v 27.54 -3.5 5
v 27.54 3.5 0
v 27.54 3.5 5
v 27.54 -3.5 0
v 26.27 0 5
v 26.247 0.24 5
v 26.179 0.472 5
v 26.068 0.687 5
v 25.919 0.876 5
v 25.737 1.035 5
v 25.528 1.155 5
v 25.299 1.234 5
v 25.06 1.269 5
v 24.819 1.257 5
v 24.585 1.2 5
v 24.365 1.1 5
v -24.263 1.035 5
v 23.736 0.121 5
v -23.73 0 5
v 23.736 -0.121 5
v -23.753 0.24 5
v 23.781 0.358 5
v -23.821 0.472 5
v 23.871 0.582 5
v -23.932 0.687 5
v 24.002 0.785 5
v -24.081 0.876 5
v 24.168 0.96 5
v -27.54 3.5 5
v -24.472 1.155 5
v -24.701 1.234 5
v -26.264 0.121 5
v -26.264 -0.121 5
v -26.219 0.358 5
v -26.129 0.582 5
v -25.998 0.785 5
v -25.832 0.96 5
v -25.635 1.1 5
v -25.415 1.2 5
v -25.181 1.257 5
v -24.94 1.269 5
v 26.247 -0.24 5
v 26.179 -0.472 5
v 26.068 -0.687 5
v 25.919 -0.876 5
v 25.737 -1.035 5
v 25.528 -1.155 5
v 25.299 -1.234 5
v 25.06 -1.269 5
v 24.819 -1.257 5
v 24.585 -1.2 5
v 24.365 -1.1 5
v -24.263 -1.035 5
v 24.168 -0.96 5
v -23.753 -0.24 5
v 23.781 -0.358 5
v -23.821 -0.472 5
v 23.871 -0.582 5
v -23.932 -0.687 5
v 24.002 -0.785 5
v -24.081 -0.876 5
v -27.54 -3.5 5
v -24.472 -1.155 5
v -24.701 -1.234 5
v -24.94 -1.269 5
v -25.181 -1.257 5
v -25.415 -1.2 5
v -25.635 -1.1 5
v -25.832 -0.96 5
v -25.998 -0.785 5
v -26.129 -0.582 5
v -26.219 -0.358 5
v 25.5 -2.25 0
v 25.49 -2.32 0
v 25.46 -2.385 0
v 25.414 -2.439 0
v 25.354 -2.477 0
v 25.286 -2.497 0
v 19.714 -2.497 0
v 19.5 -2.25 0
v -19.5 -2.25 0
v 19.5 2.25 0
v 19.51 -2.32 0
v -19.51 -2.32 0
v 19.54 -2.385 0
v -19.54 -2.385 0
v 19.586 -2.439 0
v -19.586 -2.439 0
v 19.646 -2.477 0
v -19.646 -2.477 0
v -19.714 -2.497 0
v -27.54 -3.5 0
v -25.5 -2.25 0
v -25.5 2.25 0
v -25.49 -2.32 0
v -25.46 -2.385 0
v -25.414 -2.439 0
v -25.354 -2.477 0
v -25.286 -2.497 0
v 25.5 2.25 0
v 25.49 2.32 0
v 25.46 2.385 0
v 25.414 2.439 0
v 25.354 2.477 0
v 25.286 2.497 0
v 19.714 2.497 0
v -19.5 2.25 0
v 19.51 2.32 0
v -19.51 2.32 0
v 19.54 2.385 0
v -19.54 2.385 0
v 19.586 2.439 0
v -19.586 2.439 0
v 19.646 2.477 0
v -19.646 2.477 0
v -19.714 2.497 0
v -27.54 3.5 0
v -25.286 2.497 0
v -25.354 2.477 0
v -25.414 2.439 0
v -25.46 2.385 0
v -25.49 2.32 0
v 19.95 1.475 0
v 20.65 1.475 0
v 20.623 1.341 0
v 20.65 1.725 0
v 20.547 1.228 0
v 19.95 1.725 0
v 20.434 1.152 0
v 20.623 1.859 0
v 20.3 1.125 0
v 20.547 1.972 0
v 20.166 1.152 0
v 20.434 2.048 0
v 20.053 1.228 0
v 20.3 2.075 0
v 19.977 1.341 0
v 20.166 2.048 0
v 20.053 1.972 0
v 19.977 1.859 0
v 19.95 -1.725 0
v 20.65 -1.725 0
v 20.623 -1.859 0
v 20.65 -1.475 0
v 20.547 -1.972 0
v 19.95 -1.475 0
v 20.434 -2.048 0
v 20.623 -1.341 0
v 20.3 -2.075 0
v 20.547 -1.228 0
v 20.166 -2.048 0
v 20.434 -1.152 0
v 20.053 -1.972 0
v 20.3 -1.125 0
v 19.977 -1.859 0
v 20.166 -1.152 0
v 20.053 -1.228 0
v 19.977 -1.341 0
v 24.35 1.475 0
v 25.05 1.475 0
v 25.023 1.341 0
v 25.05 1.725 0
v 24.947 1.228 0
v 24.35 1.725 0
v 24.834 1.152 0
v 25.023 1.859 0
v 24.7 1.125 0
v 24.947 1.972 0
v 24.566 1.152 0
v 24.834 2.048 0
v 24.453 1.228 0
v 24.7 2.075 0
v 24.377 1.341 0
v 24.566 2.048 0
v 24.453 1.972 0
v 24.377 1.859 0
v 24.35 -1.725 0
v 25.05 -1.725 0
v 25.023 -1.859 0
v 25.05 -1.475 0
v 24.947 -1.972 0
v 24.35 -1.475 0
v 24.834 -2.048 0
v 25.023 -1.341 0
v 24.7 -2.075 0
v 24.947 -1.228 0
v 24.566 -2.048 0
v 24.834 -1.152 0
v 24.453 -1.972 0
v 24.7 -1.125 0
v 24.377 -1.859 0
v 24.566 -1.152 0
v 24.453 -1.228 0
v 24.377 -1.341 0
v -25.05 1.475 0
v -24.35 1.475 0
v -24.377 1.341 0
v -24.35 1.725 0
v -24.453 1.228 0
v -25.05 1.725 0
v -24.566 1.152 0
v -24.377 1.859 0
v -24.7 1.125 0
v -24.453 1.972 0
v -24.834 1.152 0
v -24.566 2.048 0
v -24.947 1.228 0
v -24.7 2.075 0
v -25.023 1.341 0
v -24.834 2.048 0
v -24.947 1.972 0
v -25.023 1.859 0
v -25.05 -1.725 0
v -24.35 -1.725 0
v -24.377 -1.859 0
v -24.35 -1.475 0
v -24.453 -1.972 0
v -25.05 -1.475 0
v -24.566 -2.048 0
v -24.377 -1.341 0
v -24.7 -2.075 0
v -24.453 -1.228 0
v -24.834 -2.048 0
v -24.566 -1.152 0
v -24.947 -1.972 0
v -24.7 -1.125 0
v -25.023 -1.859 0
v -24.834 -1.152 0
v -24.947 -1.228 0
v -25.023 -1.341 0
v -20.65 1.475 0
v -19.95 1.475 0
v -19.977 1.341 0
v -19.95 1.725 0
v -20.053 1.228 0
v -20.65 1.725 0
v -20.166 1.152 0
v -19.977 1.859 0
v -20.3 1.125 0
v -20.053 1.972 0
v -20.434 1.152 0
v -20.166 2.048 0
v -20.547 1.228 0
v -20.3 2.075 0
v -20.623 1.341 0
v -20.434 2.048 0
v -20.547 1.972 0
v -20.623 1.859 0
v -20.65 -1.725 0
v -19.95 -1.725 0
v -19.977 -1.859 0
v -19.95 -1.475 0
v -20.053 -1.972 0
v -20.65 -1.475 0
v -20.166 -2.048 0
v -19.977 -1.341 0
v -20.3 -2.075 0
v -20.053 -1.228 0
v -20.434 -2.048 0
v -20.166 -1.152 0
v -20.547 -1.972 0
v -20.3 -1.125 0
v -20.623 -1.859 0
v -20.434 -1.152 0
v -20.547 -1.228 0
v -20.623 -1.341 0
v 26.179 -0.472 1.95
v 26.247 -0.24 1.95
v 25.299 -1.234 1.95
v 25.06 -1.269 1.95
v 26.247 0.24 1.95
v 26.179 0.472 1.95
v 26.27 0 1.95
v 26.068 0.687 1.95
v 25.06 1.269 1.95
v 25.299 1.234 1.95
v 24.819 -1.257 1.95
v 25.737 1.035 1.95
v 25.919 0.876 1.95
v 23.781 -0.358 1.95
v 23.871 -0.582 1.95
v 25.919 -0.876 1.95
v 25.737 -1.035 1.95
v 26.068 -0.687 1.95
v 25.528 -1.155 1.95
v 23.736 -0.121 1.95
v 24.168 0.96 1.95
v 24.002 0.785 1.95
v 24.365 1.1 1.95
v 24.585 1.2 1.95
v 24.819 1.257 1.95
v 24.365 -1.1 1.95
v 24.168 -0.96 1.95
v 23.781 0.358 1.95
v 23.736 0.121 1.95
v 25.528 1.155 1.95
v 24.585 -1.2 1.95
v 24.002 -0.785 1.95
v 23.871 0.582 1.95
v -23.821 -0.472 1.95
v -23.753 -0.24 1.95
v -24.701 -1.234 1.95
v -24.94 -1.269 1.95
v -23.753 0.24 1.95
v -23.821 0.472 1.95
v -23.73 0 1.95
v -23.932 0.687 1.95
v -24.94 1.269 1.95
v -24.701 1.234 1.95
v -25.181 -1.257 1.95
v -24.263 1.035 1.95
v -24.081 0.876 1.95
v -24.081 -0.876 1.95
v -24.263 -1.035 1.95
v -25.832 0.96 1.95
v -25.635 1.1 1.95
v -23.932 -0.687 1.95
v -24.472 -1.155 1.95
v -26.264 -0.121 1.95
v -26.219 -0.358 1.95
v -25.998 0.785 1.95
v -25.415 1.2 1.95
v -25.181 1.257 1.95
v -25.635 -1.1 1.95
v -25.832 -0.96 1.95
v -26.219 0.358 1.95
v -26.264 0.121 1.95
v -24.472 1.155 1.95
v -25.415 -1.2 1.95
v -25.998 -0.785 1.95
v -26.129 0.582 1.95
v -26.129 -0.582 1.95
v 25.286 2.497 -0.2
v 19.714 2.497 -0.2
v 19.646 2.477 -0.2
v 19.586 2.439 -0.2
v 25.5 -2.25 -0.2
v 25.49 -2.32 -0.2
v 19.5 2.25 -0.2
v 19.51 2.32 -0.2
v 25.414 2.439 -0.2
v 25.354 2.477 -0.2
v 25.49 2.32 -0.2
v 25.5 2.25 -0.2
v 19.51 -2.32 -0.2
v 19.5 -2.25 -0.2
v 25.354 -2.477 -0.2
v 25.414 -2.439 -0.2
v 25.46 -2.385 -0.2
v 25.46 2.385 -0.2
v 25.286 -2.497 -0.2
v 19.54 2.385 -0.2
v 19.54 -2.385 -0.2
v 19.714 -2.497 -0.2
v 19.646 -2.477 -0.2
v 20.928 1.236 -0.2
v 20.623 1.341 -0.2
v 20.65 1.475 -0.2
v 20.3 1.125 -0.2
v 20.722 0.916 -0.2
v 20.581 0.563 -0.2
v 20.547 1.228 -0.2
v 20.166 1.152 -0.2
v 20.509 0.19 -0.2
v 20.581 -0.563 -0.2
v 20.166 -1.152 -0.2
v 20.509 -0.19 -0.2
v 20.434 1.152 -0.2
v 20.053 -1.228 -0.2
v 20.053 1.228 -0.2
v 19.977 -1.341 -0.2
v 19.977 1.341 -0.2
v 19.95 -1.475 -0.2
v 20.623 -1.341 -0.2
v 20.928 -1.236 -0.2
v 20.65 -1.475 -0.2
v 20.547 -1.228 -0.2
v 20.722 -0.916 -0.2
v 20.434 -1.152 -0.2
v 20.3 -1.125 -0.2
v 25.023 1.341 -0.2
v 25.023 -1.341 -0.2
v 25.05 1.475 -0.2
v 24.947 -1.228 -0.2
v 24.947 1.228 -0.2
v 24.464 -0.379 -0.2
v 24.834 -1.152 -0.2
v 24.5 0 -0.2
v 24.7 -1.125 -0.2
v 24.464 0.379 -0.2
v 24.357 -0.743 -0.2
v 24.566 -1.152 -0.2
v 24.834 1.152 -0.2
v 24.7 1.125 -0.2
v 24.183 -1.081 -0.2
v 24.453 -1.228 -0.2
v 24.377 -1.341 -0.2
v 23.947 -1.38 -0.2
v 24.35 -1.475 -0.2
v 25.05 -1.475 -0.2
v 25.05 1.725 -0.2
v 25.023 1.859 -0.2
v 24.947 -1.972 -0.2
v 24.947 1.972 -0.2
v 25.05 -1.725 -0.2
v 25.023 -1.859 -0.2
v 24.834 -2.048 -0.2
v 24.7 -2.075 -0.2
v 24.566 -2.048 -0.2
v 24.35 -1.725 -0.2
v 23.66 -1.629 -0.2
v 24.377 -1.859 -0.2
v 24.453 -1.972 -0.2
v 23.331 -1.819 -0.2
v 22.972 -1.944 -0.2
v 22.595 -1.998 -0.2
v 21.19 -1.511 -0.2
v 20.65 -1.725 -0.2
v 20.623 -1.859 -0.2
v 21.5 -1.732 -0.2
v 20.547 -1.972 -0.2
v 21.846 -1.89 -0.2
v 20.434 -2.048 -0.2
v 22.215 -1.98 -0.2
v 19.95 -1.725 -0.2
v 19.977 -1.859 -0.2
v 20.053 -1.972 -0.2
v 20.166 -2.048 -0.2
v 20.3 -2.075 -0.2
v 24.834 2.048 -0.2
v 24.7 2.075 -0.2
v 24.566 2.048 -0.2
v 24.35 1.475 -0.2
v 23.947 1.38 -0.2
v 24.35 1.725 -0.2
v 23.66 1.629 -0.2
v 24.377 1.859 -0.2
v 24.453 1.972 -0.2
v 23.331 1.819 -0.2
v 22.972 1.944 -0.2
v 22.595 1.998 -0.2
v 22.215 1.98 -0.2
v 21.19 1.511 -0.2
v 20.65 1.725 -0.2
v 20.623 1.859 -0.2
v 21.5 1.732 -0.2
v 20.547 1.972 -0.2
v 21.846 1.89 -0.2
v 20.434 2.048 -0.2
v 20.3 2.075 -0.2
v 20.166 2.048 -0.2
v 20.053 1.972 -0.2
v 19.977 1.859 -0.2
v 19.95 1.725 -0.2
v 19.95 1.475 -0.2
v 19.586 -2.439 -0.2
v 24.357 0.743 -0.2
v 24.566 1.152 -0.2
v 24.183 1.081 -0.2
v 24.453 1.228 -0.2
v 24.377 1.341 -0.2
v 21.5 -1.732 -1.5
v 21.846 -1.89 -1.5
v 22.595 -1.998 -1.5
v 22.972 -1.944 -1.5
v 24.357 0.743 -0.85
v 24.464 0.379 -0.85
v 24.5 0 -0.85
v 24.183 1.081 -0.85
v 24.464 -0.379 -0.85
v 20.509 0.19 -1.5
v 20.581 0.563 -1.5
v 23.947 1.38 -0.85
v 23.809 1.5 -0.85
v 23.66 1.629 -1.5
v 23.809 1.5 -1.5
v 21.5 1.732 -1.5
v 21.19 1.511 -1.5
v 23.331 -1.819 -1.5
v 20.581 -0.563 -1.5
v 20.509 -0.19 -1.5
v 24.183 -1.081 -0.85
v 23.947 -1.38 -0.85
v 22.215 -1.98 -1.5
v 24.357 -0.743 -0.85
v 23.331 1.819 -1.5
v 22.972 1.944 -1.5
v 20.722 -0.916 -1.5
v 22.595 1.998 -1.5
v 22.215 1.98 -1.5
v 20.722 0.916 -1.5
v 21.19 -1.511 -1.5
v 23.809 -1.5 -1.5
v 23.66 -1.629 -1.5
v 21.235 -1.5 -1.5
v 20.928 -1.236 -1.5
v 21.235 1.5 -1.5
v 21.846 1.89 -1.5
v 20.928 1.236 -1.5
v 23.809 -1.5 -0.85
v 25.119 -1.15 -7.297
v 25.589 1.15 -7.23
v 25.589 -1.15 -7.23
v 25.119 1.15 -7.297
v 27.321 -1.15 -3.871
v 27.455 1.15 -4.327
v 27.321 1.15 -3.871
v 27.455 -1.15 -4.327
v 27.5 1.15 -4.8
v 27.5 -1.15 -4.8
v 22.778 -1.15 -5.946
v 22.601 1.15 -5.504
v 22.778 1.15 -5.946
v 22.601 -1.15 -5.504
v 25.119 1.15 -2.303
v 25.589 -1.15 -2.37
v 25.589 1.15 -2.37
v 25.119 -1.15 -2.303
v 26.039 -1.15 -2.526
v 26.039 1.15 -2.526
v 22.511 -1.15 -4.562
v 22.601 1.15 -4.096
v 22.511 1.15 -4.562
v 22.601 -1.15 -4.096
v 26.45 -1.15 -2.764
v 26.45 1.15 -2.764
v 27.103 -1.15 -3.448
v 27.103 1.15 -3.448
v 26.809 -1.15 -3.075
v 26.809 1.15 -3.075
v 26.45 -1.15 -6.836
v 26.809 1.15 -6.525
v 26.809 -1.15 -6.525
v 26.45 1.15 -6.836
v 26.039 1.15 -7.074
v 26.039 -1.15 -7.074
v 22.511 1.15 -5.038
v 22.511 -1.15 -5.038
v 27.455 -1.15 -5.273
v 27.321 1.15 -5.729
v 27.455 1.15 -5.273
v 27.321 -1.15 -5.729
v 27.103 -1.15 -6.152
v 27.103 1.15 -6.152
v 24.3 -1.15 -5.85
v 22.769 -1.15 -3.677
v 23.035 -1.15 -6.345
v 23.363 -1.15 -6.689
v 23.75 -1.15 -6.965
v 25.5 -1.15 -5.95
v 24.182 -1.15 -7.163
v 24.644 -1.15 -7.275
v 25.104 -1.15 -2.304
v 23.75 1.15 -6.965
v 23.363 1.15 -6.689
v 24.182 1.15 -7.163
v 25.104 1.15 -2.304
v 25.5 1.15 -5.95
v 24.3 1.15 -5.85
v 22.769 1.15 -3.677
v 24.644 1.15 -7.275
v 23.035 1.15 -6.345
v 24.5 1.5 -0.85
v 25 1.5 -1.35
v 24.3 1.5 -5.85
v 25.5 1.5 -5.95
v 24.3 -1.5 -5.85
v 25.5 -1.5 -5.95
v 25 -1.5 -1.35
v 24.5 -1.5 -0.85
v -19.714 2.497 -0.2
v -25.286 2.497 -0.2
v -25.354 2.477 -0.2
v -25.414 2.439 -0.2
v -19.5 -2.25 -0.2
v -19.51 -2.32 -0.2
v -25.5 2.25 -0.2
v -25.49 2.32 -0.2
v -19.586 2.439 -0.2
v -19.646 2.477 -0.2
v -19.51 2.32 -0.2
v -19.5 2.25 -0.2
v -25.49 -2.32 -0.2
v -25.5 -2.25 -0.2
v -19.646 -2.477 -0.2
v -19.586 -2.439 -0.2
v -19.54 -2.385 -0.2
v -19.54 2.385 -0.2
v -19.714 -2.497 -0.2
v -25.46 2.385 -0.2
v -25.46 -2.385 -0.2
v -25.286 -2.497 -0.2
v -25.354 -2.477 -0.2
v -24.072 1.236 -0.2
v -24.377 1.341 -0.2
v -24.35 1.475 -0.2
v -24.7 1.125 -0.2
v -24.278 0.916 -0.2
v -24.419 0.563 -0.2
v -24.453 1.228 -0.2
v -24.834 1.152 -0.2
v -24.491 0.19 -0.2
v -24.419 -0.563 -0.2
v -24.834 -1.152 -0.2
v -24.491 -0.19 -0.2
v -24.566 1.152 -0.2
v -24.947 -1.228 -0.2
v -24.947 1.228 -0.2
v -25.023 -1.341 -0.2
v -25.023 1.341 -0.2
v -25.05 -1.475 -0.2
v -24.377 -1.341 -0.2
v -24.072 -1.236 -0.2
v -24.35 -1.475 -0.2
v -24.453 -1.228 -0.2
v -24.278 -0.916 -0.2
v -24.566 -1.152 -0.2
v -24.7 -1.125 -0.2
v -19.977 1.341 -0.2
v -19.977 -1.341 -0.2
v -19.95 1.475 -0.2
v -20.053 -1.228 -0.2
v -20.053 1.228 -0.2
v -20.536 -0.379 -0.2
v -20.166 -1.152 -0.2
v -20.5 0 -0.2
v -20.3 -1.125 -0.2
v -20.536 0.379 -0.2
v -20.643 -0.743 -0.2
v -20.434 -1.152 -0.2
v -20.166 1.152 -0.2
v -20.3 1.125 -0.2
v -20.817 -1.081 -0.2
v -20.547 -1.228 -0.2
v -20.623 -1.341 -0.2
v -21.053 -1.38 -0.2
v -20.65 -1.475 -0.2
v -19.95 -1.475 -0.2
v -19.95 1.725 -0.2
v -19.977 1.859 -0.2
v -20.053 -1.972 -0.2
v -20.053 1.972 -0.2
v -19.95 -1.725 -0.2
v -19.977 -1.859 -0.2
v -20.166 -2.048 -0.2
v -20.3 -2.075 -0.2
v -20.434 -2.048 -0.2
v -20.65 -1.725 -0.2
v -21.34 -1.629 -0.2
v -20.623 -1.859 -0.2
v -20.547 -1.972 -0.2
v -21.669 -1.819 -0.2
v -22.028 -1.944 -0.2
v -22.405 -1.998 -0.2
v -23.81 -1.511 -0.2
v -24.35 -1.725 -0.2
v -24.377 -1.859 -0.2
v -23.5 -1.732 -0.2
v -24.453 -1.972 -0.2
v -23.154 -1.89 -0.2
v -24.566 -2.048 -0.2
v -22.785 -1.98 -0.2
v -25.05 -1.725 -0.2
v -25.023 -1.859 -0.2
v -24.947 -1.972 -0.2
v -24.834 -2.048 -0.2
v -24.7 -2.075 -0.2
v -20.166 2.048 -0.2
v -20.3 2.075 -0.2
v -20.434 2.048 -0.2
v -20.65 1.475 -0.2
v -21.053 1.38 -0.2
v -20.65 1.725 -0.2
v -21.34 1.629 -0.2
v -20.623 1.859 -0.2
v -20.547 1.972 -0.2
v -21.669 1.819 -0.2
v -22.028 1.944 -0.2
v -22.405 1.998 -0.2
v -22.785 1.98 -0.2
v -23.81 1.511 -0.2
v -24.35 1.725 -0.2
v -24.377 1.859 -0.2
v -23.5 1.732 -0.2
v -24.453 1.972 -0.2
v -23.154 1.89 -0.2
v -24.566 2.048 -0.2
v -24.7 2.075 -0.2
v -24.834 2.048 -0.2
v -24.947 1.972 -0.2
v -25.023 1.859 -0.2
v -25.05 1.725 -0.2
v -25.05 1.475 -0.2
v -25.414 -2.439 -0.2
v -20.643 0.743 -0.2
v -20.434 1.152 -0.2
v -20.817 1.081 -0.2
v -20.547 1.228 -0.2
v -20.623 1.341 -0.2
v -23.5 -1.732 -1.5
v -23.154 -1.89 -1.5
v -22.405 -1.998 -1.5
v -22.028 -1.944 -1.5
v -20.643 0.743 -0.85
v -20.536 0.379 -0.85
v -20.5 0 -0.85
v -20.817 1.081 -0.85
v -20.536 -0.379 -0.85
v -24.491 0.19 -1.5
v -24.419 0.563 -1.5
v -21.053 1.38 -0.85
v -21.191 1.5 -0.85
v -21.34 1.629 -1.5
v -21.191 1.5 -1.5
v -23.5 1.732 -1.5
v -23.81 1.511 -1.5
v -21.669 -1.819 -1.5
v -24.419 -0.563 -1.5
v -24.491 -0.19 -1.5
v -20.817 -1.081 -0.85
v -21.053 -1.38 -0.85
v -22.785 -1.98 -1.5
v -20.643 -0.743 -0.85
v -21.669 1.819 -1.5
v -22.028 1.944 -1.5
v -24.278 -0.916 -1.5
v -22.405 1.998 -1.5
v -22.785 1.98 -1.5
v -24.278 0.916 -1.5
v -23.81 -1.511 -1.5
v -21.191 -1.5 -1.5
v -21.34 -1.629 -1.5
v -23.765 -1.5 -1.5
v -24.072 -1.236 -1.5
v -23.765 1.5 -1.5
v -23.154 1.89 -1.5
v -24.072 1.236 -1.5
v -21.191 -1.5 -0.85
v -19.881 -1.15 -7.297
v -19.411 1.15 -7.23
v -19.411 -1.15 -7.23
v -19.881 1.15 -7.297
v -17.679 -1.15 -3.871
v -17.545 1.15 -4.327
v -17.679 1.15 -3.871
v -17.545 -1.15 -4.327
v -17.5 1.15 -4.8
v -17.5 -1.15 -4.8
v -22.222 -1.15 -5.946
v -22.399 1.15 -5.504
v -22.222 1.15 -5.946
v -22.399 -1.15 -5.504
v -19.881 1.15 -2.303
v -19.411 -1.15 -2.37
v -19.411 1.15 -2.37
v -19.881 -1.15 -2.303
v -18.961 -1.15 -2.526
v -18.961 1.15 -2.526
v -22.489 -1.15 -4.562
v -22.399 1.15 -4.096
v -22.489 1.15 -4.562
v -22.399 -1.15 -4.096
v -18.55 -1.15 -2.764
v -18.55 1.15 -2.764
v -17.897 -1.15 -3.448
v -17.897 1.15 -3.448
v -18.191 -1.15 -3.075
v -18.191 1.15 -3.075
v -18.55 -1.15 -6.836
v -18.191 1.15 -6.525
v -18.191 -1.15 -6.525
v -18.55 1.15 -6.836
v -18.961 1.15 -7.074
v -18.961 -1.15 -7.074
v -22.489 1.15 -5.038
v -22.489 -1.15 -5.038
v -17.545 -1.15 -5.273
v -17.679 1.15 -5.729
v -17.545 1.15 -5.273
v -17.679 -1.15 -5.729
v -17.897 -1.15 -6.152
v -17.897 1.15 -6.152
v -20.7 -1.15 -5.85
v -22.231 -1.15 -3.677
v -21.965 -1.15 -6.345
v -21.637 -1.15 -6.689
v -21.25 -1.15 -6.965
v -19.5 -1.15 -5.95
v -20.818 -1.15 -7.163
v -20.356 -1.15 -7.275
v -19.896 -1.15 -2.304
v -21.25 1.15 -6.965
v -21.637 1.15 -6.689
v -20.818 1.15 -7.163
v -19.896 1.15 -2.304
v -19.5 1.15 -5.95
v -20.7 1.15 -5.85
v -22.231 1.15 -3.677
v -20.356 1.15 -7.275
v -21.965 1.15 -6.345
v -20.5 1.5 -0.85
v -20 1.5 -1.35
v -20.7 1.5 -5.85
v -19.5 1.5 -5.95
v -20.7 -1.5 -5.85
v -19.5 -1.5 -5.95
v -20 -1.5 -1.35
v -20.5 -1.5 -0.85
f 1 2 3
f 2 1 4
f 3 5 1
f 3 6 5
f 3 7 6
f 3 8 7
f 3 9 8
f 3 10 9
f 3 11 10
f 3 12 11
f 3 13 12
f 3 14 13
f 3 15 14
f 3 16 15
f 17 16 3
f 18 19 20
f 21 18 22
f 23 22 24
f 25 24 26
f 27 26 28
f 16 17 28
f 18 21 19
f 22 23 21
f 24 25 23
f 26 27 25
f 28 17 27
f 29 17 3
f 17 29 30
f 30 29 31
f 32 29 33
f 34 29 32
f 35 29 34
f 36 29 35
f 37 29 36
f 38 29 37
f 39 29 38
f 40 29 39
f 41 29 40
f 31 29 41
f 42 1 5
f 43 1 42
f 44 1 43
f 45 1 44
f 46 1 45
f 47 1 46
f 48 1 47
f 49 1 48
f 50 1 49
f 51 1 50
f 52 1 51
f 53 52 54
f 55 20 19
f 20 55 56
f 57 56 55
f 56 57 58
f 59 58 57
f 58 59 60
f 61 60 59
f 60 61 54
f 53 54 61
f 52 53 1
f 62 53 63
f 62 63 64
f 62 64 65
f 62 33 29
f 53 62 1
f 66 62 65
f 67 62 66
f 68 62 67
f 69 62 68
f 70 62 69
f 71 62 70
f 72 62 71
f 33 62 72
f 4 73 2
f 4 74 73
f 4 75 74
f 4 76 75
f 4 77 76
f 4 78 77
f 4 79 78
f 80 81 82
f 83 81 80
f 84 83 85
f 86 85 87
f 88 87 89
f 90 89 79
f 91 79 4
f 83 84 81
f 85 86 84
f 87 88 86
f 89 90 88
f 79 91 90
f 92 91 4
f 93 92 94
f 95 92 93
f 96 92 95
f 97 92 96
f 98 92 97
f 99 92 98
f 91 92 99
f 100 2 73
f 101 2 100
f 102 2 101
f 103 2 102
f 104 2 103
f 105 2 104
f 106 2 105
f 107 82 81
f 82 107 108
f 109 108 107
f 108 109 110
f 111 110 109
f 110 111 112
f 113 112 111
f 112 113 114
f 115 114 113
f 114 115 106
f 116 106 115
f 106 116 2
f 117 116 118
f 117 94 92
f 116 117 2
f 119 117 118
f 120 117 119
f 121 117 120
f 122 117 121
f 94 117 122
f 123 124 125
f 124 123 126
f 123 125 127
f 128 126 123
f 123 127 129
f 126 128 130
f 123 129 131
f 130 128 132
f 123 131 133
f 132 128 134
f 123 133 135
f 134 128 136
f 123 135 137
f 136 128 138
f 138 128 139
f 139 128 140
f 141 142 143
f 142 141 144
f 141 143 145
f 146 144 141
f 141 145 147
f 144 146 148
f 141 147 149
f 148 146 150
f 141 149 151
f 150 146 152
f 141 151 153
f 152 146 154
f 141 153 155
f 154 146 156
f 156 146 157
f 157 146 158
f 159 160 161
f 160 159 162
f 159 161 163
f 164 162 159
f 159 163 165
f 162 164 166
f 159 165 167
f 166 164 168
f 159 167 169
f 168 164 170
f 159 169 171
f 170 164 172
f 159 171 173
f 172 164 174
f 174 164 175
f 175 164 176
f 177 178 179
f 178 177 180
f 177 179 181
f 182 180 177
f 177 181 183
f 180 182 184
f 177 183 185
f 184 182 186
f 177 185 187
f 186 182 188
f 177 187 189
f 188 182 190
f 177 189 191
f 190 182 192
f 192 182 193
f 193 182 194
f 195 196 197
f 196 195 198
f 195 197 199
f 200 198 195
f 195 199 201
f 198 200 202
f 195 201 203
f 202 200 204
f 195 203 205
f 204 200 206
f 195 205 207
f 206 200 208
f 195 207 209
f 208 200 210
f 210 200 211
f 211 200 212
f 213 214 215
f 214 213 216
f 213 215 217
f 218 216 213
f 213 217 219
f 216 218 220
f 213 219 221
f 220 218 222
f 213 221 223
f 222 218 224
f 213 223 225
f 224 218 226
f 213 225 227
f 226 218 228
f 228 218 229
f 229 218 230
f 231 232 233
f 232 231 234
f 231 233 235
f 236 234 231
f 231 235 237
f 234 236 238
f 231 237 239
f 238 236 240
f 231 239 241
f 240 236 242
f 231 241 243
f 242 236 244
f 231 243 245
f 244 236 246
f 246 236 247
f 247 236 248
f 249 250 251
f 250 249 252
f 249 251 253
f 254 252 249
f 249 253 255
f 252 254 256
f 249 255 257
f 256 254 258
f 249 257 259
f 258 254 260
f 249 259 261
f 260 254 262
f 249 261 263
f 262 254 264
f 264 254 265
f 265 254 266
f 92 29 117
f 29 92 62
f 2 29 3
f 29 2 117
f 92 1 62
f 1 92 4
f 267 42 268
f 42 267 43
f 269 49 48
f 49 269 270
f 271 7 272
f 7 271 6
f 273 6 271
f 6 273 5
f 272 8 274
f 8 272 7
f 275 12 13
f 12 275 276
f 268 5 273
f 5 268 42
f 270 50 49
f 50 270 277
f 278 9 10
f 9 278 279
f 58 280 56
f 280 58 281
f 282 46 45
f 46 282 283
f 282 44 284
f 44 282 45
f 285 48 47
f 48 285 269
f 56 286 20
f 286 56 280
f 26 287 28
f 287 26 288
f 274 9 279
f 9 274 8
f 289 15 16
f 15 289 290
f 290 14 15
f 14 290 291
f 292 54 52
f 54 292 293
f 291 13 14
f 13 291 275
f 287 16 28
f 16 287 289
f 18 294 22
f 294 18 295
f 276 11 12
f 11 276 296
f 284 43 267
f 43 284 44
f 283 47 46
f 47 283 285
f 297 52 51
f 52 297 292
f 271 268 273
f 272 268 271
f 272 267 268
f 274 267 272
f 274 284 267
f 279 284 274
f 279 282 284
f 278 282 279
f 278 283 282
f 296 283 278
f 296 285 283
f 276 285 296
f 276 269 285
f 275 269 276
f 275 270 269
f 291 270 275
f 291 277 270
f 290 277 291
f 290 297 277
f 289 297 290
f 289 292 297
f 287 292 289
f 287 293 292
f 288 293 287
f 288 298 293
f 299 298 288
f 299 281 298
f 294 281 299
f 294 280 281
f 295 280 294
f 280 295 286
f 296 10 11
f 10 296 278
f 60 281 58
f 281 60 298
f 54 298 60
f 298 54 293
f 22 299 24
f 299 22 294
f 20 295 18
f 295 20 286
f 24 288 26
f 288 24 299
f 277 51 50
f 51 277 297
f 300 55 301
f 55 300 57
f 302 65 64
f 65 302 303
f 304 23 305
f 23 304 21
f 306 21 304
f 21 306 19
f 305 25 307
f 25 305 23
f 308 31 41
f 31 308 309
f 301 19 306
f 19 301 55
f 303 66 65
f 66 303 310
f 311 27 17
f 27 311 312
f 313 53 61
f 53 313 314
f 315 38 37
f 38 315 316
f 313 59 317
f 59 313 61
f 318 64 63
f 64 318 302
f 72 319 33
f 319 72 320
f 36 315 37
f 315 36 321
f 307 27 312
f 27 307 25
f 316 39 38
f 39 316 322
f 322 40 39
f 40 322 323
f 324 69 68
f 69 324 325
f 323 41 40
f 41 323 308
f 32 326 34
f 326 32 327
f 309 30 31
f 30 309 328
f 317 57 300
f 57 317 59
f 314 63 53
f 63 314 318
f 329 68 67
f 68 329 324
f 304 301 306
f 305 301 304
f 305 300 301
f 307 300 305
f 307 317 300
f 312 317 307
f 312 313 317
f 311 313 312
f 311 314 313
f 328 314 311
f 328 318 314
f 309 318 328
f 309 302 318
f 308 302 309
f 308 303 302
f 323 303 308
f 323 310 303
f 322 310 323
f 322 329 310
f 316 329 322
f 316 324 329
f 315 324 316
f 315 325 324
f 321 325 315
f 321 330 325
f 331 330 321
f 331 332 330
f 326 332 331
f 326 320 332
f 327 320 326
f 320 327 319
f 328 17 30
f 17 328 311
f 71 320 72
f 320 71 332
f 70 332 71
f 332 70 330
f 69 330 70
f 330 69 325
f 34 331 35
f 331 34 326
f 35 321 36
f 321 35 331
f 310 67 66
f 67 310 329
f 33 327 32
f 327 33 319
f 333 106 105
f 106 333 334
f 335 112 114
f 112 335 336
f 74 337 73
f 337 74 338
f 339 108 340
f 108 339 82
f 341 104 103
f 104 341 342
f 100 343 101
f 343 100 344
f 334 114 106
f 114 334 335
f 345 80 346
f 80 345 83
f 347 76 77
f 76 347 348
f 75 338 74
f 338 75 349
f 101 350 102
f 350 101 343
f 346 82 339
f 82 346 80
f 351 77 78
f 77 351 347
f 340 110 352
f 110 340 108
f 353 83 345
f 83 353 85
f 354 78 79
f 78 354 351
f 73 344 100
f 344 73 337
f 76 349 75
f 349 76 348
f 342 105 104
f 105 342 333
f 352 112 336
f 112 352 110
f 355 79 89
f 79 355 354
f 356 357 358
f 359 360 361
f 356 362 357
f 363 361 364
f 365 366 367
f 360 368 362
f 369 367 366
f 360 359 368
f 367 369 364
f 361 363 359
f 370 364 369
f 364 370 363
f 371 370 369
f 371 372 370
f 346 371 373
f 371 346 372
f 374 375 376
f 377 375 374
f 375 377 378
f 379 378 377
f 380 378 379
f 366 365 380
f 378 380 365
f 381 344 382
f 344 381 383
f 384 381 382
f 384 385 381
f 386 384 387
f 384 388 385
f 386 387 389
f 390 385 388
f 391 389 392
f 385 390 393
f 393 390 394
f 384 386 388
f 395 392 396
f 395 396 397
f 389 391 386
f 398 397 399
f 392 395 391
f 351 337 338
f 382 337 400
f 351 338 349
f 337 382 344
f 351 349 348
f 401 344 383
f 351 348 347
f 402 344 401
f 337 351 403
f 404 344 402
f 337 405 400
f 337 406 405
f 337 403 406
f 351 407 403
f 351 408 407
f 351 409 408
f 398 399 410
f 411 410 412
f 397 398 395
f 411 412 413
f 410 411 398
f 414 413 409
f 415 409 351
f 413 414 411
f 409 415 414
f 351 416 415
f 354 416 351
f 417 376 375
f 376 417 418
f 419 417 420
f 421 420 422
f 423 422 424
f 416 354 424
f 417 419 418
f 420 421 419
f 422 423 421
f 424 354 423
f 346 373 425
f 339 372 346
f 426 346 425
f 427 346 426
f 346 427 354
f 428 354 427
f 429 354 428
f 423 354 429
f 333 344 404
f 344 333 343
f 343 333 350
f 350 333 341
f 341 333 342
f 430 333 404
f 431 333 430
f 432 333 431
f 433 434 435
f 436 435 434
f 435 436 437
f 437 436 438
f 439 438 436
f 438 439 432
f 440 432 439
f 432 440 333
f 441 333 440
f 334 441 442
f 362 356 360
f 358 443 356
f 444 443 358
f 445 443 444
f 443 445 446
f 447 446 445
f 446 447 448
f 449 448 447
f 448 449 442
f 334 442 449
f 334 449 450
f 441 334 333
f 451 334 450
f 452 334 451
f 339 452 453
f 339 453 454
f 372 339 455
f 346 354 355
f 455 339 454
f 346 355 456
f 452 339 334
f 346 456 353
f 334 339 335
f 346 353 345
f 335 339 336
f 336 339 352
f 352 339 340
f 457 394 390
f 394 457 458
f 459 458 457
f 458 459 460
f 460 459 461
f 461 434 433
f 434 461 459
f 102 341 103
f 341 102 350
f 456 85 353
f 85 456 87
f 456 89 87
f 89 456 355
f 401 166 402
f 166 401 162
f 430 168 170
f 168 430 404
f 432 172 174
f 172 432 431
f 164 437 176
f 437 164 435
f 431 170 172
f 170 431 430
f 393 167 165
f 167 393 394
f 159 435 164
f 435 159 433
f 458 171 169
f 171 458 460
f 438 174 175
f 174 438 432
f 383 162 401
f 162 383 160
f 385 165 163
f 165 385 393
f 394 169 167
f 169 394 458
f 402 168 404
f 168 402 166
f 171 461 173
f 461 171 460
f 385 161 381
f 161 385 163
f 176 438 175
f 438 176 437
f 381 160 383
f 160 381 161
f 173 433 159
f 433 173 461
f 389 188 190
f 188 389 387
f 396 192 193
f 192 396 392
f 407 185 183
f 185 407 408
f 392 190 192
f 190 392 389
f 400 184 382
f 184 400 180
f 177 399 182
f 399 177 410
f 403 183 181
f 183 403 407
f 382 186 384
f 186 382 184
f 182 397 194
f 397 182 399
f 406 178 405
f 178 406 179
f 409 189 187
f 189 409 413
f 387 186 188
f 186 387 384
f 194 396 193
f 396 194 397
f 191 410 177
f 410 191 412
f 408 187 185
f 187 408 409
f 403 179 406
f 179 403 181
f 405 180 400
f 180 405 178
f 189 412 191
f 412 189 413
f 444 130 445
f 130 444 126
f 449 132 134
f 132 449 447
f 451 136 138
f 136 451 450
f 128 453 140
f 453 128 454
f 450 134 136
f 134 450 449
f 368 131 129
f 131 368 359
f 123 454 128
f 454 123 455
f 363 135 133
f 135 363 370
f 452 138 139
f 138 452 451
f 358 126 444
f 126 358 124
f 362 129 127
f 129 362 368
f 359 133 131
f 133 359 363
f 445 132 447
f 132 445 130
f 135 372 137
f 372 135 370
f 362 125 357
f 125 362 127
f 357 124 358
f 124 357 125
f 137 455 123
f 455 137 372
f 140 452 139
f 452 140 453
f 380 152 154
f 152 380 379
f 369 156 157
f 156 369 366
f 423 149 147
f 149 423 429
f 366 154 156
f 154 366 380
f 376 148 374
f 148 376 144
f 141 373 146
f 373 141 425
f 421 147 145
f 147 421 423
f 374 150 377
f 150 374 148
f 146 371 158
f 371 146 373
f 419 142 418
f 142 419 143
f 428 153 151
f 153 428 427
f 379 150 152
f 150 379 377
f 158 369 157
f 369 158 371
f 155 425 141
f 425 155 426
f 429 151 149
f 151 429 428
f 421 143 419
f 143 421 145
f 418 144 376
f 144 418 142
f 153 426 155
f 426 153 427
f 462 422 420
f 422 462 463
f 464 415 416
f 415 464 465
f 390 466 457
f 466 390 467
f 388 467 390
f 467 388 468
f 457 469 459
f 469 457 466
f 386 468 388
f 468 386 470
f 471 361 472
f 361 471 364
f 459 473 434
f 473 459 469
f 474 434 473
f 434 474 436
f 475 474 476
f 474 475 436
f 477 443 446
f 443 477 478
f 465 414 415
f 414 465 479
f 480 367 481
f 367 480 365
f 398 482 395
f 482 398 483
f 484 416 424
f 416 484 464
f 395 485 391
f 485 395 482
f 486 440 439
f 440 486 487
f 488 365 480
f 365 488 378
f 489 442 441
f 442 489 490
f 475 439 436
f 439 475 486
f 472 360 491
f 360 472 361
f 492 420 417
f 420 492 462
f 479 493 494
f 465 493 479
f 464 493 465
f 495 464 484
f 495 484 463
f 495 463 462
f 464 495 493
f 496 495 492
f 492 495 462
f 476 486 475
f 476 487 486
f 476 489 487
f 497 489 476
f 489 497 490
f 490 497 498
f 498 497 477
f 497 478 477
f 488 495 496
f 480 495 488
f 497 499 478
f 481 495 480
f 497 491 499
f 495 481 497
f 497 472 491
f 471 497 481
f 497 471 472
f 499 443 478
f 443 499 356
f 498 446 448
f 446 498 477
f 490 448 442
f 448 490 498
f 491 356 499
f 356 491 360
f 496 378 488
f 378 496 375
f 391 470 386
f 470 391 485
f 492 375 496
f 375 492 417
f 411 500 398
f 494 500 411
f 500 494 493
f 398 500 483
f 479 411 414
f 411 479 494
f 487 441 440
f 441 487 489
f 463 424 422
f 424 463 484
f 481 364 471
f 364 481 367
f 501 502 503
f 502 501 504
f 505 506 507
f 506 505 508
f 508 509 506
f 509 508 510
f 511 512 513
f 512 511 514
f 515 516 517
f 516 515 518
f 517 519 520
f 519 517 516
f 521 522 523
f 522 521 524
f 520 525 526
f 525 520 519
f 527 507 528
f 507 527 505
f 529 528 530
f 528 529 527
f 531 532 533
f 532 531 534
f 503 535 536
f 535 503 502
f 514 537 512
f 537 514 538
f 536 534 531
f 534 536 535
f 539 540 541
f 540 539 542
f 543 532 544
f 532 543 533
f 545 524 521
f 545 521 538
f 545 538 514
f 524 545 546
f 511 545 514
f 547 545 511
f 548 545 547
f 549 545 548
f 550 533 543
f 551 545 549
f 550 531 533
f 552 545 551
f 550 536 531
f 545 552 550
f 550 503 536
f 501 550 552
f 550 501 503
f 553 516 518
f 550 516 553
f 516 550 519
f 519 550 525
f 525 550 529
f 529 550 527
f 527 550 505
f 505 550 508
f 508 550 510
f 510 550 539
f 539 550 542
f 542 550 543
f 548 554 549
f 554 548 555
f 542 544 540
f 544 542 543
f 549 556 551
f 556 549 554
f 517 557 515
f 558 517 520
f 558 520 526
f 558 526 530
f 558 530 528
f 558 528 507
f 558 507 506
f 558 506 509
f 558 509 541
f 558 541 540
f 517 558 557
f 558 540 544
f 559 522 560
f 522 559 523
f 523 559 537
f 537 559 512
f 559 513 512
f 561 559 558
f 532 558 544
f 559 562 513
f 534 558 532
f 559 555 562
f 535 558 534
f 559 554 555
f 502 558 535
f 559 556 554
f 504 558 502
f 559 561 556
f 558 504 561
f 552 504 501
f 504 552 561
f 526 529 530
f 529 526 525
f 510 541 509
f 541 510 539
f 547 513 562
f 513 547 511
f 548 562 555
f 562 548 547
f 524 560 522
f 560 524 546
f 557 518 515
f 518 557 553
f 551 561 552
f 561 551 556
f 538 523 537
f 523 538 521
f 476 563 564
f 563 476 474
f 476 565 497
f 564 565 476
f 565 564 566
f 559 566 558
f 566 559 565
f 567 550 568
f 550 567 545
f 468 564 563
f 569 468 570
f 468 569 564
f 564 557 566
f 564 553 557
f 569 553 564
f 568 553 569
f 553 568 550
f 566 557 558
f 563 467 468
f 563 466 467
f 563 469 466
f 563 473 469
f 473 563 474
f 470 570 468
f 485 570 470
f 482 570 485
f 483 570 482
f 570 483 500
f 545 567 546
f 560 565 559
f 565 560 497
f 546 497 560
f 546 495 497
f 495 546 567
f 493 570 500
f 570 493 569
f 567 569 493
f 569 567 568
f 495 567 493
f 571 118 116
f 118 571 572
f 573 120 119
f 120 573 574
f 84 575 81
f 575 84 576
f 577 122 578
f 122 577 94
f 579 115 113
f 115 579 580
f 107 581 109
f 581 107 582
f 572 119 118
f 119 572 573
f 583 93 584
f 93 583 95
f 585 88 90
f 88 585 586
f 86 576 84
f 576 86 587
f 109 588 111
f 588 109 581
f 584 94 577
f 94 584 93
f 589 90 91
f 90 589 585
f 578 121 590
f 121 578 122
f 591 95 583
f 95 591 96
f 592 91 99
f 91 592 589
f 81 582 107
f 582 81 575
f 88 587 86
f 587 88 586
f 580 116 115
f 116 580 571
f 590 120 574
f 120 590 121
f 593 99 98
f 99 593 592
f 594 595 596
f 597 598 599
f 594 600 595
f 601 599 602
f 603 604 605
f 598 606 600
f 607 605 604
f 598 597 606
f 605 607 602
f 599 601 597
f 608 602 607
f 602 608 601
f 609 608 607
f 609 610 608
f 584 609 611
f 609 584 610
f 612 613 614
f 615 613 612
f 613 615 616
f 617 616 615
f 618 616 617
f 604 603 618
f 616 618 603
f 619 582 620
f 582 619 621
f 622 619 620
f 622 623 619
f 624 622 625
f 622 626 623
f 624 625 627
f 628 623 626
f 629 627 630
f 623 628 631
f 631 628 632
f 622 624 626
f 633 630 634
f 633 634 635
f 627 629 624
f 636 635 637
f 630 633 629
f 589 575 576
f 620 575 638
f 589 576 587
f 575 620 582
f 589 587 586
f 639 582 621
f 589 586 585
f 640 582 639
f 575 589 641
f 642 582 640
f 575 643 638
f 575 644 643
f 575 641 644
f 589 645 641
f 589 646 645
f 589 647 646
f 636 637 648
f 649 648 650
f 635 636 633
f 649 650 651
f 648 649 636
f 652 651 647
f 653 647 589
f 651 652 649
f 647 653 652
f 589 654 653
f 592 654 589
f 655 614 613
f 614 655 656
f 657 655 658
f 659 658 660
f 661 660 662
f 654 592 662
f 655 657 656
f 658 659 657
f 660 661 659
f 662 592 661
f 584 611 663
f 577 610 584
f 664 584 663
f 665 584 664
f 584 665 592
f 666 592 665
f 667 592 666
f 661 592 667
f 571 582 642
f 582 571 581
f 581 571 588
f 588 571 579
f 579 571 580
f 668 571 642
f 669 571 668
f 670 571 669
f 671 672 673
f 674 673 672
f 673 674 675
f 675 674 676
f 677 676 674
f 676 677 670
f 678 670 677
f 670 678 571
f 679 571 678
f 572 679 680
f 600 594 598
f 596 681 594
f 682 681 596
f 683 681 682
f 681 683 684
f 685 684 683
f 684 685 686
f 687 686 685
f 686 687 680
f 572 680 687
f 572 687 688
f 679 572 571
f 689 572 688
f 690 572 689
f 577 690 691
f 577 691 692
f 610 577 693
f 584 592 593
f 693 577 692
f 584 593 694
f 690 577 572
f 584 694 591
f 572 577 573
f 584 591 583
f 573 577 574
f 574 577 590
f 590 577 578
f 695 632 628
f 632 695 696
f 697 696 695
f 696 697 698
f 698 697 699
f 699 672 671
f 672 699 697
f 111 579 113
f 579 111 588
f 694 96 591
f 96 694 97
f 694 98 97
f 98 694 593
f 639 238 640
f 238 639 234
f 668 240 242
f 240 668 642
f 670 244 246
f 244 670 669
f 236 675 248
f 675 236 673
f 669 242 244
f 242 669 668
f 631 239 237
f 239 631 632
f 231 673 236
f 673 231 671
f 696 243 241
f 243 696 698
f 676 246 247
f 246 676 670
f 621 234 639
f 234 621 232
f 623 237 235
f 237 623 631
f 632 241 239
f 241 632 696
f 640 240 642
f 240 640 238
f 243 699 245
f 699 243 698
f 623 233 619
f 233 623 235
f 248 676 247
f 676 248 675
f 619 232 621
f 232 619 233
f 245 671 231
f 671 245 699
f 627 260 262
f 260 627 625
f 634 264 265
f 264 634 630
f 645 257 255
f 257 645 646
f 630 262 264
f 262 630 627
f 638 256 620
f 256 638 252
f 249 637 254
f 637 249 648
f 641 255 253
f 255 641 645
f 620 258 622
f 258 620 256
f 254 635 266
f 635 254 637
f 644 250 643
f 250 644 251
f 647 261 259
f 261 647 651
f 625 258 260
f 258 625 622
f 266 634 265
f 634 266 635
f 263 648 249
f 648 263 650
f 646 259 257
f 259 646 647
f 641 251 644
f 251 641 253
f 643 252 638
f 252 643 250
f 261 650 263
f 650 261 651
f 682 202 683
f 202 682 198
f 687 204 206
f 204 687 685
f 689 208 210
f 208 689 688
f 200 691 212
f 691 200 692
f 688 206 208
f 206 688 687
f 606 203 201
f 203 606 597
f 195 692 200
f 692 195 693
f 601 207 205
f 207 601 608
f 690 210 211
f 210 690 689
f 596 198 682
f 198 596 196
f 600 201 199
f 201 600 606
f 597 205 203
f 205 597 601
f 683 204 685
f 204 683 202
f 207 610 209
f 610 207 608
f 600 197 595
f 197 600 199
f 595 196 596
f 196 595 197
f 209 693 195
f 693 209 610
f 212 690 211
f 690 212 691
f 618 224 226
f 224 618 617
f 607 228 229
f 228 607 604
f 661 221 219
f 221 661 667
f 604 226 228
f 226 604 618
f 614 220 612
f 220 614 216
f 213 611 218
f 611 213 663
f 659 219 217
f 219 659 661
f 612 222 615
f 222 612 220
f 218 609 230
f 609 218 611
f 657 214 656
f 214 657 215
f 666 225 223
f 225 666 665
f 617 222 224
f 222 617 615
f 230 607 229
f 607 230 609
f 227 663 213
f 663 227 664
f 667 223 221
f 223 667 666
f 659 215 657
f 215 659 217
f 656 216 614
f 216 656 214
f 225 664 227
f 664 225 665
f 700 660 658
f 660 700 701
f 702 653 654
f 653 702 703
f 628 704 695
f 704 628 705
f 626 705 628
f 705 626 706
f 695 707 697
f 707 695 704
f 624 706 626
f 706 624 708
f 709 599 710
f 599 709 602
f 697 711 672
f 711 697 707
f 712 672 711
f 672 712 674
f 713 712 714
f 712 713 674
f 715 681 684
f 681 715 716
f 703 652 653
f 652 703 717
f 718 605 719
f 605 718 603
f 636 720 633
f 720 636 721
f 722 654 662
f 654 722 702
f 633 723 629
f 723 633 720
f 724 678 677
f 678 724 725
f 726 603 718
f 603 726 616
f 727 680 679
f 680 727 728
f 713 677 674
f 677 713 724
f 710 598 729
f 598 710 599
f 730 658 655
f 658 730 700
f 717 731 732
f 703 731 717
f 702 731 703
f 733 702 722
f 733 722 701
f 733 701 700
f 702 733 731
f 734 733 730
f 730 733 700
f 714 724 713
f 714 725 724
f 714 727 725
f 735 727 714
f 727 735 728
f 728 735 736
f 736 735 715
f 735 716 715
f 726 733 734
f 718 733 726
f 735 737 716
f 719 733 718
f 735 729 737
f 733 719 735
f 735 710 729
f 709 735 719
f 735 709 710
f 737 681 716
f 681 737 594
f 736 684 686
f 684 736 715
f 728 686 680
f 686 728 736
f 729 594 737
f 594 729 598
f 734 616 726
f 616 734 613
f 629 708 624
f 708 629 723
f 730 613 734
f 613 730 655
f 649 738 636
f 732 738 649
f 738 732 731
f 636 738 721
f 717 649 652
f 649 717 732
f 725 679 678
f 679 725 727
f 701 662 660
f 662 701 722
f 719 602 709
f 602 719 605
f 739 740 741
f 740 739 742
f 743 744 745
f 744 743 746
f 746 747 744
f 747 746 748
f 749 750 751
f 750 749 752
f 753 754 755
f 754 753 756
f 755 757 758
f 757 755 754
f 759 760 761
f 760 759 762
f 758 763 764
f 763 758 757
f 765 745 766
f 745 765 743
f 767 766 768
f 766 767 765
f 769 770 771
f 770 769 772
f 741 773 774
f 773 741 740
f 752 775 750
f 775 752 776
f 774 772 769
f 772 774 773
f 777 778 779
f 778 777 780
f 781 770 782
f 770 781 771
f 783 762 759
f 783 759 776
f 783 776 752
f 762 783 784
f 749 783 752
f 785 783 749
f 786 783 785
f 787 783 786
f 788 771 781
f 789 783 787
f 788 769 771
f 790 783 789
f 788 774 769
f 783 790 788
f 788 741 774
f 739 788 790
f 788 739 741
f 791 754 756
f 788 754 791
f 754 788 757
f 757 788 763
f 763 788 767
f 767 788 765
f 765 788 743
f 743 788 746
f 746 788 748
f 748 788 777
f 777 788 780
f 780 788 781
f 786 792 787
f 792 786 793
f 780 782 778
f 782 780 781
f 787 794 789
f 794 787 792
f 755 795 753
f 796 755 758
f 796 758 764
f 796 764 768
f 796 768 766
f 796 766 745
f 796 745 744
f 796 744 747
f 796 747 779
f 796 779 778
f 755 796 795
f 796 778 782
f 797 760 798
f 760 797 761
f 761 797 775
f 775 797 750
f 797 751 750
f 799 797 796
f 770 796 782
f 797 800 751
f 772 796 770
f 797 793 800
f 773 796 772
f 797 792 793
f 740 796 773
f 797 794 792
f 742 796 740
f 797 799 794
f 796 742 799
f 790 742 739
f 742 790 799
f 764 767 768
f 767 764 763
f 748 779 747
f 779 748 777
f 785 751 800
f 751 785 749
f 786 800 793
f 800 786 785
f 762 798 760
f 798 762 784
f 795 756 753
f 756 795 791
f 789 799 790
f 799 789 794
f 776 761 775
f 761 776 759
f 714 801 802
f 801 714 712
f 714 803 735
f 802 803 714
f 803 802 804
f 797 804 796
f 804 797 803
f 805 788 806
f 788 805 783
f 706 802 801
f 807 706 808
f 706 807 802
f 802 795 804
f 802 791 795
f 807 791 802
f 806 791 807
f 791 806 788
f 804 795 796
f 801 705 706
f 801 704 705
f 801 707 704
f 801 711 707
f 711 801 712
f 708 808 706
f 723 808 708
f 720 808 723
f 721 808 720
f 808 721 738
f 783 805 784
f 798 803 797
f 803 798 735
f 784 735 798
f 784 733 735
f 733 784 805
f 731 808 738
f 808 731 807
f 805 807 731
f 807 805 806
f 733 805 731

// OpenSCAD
// file: wheel.scad
fixing_plate_t = 0.2;
hinge_cylinder_h = 1.3;
hinge_cylinder_d = 4;

module wheel_assembly()
{
    fixing_plate();
    hinge_cylinder(-fixing_plate_t);
    wheel(-fixing_plate_t-hinge_cylinder_h);
    wheel_fixture(-fixing_plate_t-hinge_cylinder_h/2);
}

module fixing_plate()
{
    fixing_plate_l = 6;
    fixing_plate_w = 5;
    rounded_end_d = 0.5;
    hole_dx = 0.8;
    hole_dy = 0.9;
    
    translate([0,0,-fixing_plate_t/2]) 
    difference()
    {
        minkowski()
        {
            cube([fixing_plate_l-rounded_end_d, fixing_plate_w-rounded_end_d, 0.001], center = true);
            cylinder(d=rounded_end_d,h=fixing_plate_t, center=true, $fn = 22);
        }
        translate([(fixing_plate_l/2-hole_dx),(fixing_plate_w/2-hole_dy),0]) 
        fixing_plate_hole();
        translate([(fixing_plate_l/2-hole_dx),-(fixing_plate_w/2-hole_dy),0]) 
        fixing_plate_hole();
        translate([-(fixing_plate_l/2-hole_dx),(fixing_plate_w/2-hole_dy), 0]) 
        fixing_plate_hole();
        translate([-(fixing_plate_l/2-hole_dx),-(fixing_plate_w/2-hole_dy),0]) 
        fixing_plate_hole();
    }
}

module fixing_plate_hole()
{
    hole_size = 0.7;
    center_points_d = 0.25;
    hole_h = fixing_plate_t + 0.1;

    hull() {
        translate([0,-center_points_d/2,0])
        cylinder(h=hole_h, d=hole_size, center = true, $fn = 16);

        translate([0,center_points_d/2,0])
        cylinder(h=hole_h, d=hole_size, center = true, $fn = 16);
    }
}

module hinge_cylinder(top_y)
{
    
    translate([0,0,top_y-hinge_cylinder_h/2])
    cylinder(d=hinge_cylinder_d,h=hinge_cylinder_h, center=true, $fn = 33);
}

module wheel(top_y)
{
    wheel_d = 5;
    wheel_t = 2.3;
    wheel_dz = 3.3;
    wheel_dx = 2.5;

    color([0.75,0.75,0.75,1])
    translate([wheel_dx,0,top_y-wheel_dz])
    rotate([90,0,0])
    cylinder(d=wheel_d,h=wheel_t, center=true, $fn = 33);
}

module wheel_fixture(top_y)
{
    translate([0,0,top_y])
    rotate([-90,0,0])
    linear_extrude(3, center = true) 
        polygon(points=[[-1.3,0],
            [hinge_cylinder_d/2, 0],
            [2.5, 0.5],
            [3.0, 5.1],
            [1.8, 5.0],
            [-1.3,0.6]]);
 
}

wheel_assembly();
// main file
use <wheel.scad> 

wb_dx = 1.0*2.54;
wheel_dist = 45;

module wheel_base(leg_dist = 50, wood_w = 7, wood_h = 5, hole_diam = 2.54, hole_depth=3)
{
    wheel_base2(leg_dist, wood_w, wood_h, hole_diam);
    
    translate([wheel_dist/2,0, 0])
    //rotate([0,0,90])
    wheel_assembly();
    translate([-wheel_dist/2,0, 0])
    wheel_assembly();
}

module wheel_base2(leg_dist = 50, wood_w = 7, wood_h = 5, hole_diam = 2.54, hole_depth=3)
{
    translate([0,0,wood_h/2]) color([166/255, 90/255, 23/255, 1]) difference()
    {
        cube([leg_dist+2*wb_dx, wood_w, wood_h], center=true);

        translate([leg_dist/2,0, wood_h-hole_depth])
        cylinder(d=hole_diam,h=wood_h+0.1, center=true, $fn = 33);

        translate([-leg_dist/2,0, wood_h-hole_depth])
        cylinder(d=hole_diam,h=wood_h+0.1, center=true, $fn = 33);
    }
}


wheel_base();
